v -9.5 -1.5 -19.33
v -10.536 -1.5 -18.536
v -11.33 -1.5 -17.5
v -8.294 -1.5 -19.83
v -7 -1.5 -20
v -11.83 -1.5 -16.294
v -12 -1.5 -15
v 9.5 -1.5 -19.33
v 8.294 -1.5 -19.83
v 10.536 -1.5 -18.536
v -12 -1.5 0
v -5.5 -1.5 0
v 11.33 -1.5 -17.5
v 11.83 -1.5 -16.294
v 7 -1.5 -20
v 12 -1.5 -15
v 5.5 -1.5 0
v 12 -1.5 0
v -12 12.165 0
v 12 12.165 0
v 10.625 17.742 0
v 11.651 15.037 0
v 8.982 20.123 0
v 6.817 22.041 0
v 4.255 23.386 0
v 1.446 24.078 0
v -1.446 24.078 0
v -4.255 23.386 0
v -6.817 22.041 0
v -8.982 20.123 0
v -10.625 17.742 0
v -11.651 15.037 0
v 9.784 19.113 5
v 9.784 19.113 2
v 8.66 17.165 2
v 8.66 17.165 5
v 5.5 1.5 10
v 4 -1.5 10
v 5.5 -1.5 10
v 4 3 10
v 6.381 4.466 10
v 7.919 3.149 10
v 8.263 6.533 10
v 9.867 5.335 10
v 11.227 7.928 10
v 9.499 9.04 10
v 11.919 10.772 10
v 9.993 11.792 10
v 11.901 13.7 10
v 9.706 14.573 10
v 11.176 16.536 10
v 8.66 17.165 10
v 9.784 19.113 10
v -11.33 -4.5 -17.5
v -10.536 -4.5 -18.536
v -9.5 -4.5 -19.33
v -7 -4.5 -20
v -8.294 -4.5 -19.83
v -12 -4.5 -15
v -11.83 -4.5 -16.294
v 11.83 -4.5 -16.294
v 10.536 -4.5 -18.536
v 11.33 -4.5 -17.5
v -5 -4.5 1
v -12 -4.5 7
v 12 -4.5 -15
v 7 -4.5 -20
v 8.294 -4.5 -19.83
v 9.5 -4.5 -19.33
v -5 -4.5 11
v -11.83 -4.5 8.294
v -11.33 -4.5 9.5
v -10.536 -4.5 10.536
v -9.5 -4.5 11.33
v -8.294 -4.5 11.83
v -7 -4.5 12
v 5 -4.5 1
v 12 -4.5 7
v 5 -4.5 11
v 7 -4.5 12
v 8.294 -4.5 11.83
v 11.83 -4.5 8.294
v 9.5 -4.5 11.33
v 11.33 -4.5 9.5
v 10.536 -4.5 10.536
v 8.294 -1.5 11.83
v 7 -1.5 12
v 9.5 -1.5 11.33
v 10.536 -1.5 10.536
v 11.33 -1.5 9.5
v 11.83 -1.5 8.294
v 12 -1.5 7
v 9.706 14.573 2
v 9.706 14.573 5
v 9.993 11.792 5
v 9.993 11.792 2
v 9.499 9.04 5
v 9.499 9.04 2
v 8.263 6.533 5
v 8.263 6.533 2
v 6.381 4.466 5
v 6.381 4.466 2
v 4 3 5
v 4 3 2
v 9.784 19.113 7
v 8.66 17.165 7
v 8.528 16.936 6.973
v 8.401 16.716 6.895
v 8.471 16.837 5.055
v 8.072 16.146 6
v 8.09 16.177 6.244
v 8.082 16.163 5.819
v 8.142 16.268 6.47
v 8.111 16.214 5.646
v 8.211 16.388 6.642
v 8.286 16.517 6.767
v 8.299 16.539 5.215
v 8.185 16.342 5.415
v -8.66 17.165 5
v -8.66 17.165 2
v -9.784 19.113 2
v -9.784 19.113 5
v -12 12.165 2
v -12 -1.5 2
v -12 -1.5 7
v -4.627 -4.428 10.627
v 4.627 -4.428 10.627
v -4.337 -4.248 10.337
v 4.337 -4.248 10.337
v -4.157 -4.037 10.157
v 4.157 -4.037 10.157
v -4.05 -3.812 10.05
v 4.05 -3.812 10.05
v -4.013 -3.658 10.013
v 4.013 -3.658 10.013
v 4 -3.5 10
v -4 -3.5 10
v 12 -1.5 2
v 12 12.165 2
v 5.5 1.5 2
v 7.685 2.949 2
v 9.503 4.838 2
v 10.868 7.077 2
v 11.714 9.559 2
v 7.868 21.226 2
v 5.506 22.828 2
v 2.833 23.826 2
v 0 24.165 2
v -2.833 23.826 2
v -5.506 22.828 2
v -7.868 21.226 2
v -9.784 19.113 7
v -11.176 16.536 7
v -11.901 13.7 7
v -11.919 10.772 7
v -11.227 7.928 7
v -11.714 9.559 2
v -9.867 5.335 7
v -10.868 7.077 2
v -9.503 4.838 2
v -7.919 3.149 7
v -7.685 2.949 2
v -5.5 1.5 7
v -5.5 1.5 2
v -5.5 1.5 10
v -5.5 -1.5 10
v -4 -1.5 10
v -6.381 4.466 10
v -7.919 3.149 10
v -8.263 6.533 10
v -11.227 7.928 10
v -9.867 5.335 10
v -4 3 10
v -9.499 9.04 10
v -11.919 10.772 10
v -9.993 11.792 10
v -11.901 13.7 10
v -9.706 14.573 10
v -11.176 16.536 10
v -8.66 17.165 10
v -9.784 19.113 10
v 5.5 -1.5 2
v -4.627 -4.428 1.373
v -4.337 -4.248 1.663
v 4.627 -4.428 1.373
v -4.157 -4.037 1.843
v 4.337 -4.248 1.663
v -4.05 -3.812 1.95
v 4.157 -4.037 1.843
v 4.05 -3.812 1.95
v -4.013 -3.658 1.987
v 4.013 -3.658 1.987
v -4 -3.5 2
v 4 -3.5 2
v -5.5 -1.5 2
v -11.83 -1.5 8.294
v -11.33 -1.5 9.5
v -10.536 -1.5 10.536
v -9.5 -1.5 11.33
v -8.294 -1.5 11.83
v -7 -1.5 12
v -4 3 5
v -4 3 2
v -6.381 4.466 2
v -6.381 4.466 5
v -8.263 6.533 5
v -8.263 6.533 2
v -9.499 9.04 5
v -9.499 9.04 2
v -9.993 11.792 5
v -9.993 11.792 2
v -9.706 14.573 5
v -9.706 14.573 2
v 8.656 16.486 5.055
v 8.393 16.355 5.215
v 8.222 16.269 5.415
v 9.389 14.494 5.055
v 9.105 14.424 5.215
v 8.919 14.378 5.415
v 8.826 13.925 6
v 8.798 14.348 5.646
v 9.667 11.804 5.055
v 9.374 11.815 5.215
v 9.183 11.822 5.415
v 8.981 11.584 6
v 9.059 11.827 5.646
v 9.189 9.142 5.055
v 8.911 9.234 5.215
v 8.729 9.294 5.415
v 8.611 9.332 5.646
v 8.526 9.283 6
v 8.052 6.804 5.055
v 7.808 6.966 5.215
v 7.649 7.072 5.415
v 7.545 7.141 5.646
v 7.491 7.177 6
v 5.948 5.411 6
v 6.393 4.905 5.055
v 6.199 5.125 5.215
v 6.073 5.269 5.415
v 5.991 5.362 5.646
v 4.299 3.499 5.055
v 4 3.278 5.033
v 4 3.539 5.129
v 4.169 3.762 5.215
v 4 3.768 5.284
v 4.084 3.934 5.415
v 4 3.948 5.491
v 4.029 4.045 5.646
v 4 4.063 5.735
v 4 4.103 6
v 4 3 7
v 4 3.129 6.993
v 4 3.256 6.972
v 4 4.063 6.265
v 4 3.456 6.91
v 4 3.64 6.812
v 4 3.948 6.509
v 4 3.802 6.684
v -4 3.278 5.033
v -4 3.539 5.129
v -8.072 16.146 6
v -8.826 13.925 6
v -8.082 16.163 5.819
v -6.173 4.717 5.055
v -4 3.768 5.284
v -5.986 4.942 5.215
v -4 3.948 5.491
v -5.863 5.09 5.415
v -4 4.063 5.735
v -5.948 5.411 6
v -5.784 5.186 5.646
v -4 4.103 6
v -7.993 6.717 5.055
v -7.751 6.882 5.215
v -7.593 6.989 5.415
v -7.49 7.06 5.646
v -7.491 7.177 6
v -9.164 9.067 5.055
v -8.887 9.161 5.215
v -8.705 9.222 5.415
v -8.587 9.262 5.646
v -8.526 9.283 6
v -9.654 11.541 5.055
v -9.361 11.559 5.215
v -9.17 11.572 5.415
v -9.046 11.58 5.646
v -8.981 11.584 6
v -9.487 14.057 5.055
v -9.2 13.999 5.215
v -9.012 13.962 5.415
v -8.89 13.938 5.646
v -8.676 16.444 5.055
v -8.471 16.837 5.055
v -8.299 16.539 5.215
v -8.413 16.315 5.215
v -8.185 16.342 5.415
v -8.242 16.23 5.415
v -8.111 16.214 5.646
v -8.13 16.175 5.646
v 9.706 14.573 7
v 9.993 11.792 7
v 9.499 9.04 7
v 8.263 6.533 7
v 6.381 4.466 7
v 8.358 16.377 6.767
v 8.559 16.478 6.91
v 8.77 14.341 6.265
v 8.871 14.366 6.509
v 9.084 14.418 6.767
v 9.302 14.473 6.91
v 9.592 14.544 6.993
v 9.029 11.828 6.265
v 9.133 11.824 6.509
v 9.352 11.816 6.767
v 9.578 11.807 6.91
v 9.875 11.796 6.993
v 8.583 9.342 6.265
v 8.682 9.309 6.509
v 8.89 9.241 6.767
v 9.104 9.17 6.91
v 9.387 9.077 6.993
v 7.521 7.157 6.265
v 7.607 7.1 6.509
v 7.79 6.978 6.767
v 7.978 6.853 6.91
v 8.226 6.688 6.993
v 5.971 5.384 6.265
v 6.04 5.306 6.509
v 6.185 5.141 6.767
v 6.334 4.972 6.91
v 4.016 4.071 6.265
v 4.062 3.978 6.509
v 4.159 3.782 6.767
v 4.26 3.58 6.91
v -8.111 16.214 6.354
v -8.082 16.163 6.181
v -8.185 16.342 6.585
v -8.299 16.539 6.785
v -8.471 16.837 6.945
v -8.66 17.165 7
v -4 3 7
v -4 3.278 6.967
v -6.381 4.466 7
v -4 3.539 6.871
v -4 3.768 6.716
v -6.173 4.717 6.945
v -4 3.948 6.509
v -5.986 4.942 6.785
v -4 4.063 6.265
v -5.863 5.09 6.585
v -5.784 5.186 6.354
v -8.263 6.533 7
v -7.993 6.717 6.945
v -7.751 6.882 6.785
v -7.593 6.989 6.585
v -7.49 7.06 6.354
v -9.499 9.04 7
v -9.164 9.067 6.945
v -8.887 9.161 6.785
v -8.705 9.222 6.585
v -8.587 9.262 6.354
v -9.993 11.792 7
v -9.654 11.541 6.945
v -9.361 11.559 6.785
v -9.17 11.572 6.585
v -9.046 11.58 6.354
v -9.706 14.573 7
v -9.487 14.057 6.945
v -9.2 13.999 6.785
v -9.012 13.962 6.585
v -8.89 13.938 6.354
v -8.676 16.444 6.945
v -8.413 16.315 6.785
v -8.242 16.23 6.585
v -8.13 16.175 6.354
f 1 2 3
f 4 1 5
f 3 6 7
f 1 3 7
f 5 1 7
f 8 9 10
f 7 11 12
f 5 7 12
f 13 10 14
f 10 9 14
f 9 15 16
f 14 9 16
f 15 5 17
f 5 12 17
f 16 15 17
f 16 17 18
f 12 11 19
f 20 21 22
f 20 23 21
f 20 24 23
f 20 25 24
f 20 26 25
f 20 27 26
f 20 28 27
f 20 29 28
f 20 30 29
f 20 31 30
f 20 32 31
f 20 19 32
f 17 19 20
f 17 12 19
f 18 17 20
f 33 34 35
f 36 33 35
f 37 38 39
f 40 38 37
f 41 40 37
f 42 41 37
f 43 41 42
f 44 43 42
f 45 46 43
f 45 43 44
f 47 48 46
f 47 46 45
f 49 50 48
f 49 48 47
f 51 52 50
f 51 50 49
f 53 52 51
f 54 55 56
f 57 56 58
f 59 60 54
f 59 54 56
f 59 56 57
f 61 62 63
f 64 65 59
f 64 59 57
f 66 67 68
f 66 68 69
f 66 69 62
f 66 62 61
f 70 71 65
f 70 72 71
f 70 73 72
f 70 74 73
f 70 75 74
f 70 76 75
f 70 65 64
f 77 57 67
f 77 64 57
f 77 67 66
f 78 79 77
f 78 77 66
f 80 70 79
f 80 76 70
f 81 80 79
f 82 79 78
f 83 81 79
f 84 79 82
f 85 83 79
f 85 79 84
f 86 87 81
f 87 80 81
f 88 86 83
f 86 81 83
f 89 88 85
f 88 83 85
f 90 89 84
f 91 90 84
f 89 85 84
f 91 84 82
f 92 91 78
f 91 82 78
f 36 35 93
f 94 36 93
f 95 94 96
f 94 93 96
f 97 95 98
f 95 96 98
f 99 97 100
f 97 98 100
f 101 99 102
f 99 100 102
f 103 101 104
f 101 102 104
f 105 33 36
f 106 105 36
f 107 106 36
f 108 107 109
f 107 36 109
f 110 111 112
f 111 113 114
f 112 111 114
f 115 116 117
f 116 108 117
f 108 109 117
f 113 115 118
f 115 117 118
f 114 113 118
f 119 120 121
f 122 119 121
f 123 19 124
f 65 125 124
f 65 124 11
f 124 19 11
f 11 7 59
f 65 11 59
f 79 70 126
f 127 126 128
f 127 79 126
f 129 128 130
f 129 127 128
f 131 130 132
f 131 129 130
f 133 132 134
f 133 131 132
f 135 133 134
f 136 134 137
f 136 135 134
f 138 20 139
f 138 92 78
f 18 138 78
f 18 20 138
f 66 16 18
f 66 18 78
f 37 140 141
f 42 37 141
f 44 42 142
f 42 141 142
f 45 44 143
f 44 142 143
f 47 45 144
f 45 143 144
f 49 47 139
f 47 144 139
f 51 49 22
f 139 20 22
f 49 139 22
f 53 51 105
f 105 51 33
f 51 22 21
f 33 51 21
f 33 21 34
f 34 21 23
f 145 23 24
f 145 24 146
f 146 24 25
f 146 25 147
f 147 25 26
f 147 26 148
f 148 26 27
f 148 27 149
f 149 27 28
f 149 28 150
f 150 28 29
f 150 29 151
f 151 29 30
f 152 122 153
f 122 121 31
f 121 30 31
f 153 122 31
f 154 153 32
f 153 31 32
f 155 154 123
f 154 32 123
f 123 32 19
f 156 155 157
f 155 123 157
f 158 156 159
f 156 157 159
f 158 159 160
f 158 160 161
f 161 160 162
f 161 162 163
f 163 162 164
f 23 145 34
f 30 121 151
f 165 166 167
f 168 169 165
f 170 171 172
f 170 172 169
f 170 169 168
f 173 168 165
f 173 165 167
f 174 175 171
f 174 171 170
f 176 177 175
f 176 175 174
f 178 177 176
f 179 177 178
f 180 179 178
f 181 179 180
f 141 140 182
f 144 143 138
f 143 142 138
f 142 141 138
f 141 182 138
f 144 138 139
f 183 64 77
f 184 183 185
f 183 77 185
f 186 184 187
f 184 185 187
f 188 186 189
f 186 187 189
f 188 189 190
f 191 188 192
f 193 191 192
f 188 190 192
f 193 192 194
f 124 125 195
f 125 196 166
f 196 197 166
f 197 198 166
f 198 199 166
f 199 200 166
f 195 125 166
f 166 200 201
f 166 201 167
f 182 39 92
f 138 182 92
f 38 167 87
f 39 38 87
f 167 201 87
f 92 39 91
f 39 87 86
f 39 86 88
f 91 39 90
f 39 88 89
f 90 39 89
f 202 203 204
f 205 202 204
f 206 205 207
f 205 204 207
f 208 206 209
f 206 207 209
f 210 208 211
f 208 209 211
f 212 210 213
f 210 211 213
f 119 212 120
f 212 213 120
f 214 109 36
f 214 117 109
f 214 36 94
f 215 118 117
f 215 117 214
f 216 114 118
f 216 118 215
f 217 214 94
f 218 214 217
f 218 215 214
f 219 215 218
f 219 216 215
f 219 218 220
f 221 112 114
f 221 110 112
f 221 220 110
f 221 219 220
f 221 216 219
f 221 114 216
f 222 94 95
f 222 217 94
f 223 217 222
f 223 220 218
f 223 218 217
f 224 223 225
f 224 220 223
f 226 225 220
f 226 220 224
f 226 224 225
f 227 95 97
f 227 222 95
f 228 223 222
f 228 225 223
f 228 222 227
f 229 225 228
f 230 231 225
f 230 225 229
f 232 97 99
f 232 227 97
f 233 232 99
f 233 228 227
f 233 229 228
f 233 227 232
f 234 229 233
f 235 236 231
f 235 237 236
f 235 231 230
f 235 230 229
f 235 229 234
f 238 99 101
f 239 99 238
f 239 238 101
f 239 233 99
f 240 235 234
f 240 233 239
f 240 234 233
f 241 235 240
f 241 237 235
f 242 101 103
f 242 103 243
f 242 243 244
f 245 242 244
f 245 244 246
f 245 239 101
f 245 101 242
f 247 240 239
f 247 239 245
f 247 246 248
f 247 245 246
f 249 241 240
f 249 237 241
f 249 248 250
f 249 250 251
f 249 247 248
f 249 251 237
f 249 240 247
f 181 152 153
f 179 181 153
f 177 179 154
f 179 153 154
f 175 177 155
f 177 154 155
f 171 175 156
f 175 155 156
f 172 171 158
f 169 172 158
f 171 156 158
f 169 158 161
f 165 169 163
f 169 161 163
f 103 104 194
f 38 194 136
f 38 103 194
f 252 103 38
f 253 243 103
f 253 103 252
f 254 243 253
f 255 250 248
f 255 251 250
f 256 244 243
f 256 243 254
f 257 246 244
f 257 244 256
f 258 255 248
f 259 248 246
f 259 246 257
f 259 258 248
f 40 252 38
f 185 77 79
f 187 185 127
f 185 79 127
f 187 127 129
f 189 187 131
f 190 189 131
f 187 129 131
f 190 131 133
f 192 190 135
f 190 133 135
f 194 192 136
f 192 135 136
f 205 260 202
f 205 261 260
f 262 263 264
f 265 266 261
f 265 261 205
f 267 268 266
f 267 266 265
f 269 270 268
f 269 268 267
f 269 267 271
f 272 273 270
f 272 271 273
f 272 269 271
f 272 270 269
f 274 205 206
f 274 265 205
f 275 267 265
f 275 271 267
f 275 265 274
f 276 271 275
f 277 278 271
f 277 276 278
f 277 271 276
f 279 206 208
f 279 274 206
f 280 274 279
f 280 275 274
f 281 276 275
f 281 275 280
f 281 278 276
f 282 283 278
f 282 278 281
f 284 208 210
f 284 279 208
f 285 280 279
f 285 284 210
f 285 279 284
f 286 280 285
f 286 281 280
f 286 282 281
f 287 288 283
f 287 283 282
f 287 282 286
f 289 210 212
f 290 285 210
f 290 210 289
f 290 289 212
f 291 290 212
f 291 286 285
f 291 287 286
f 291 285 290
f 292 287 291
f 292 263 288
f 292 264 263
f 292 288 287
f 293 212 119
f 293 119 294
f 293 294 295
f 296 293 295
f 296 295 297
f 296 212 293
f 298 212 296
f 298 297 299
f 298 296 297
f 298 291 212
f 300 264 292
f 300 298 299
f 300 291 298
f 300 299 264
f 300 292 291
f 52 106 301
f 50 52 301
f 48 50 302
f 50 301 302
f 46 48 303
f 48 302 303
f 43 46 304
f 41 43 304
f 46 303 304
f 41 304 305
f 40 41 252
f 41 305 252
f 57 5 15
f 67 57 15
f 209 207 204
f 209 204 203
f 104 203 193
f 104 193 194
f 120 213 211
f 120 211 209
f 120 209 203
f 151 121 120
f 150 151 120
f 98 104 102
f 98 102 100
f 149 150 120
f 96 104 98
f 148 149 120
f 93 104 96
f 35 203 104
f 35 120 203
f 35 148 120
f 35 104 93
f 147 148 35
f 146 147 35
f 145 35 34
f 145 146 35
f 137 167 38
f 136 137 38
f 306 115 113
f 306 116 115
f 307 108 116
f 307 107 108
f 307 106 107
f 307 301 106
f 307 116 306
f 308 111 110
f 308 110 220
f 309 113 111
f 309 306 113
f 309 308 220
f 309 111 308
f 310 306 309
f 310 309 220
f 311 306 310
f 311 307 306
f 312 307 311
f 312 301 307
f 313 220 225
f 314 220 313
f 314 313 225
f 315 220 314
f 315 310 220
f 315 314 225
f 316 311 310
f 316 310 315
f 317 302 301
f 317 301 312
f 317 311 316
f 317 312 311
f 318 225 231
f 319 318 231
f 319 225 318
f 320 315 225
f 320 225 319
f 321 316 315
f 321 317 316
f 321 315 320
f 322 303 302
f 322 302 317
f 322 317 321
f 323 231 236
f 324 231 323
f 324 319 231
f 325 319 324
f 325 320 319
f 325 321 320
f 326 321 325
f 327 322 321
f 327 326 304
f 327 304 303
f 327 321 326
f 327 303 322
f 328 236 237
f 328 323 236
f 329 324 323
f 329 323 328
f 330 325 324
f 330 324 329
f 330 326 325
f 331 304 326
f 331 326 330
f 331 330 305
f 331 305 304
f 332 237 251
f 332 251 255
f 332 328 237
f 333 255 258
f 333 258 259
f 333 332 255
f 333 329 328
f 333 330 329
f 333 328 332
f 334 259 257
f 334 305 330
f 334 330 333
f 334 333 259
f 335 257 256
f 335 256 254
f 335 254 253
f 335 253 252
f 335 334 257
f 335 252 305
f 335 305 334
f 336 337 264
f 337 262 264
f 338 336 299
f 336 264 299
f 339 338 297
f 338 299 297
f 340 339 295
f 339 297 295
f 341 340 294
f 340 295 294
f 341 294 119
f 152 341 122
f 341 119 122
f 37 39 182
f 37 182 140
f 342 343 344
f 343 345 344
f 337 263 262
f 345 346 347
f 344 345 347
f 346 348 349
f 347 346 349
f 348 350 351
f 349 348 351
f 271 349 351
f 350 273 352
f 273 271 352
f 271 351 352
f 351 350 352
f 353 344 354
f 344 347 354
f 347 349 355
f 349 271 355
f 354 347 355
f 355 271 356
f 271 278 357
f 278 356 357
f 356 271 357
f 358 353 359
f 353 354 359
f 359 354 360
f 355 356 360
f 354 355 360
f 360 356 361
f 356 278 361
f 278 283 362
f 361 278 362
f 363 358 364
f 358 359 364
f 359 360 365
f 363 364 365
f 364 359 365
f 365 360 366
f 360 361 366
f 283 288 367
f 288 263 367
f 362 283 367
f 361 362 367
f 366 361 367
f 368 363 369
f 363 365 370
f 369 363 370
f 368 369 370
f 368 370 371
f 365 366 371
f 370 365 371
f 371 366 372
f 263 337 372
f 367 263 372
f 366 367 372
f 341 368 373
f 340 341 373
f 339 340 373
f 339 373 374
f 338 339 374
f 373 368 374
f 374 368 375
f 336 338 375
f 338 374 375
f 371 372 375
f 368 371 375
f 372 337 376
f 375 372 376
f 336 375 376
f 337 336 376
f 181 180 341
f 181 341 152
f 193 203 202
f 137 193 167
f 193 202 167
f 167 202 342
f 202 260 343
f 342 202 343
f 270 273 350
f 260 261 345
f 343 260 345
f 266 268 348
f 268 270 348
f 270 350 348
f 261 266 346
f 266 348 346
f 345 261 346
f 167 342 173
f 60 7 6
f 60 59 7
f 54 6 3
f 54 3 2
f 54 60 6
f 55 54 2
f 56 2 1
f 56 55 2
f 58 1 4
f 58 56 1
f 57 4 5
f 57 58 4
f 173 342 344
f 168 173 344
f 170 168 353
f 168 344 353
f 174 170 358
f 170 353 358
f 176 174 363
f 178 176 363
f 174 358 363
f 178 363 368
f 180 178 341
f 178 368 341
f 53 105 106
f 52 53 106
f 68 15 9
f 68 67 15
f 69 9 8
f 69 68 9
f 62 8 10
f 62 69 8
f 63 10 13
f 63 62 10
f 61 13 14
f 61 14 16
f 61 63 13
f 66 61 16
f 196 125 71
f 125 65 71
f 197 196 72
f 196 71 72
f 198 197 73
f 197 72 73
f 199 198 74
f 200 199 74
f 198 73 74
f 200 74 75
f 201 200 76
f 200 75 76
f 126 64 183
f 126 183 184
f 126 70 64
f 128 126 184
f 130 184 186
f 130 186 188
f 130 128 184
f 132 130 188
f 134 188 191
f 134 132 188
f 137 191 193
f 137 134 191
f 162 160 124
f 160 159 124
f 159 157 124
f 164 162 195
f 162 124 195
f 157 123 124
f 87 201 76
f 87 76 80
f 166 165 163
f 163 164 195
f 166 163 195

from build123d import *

# Parameters (mm, degrees)
F1_DEPTH  = 2
F3_DEPTH  = 3
F5_DEPTH  = 2
F7_DEPTH  = 3
F8_R      = 0.99999
F9_W      = 24
F9_H      = 22.6653645039
F10_DEPTH = 10
F11_W     = 24
F11_H     = 32
F11_W_2   = 8
F11_H_2   = 8
F12_DEPTH = 3
F13_R     = 1
F14_R     = 5
F15_W     = 24
F15_H     = 13.6653645039
F16_DEPTH = 2


# Not quite as in the source:
# - a fillet or chamfer is up to 0.001 mm smaller than in the source, because OpenCascade refuses the exact size


with BuildPart() as f1:
    # F0 (on Top) → F1 (new body)
    with BuildSketch(Plane.XY):
        with BuildLine():
            ThreePointArc((5.5, 1.5), (0, 24.1653645039), (-5.5, 1.5))
            Line((-5.5, 1.5), (-5.5, -1.5))
            ThreePointArc((-5.5, -1.5), (0, -24.1653645039), (5.5, -1.5))
            Line((5.5, -1.5), (5.5, 1.5))
        make_face()
    extrude(amount=F1_DEPTH)

    # F2 (on face) → F3 (join)
    with BuildSketch(Plane.XY.offset(2)):
        with BuildLine():
            Line((9.7844830762, 19.1125863177), (8.6602540378, 17.1653645039))
            ThreePointArc((8.6602540378, 17.1653645039), (9.4991255677, 9.0402063559), (4, 3.0002131139))
            Line((4, 3.0002131139), (4, -6.2432010007))
            Line((4, -6.2432010007), (9.1651513899, -16.1653645039))
            ThreePointArc((9.1651513899, -16.1653645039), (9.5868378212, -9.3206253964), (5.5, -3.8137179596))
            Line((5.5, -3.8137179596), (5.5, 1.5))
            ThreePointArc((5.5, 1.5), (11.6599594736, 9.3289327537), (9.7844830762, 19.1125863177))
        make_face()
        with BuildLine():
            ThreePointArc((-4, 3.0002131139), (-9.4991255677, 9.0402063559), (-8.6602540378, 17.1653645039))
            Line((-8.6602540378, 17.1653645039), (-9.7844830762, 19.1125863177))
            ThreePointArc((-9.7844830762, 19.1125863177), (-11.6599594736, 9.3289327537), (-5.5, 1.5))
            Line((-5.5, 1.5), (-5.5, -3.8137179596))
            ThreePointArc((-5.5, -3.8137179596), (-9.5868378212, -9.3206253964), (-9.1651513899, -16.1653645039))
            Line((-9.1651513899, -16.1653645039), (-4, -6.2432010007))
            Line((-4, -6.2432010007), (-4, 3.0002131139))
        make_face()
    extrude(amount=F3_DEPTH)

    # F4 (on face) → F5 (join)
    with BuildSketch(Plane.XY.offset(5)):
        with BuildLine():
            Line((-8.0717844057, 16.1461052023), (-9.7844830762, 19.1125863177))
            ThreePointArc((-9.7844830762, 19.1125863177), (-11.6599594736, 9.3289327537), (-5.5, 1.5))
            Line((-5.5, 1.5), (-5.5, -5.0414610795))
            ThreePointArc((-5.5, -5.0414610795), (-8.6043935433, -9.5263473097), (-8.5483759414, -14.980549891))
            Line((-8.5483759414, -14.980549891), (-4, -6.2432010007))
            Line((-4, -6.2432010007), (-4, 4.1031067556))
            ThreePointArc((-4, 4.1031067556), (-8.5258693153, 9.2827350759), (-8.0717844057, 16.1461052023))
        make_face()
        with BuildLine():
            ThreePointArc((5.5, 1.5), (11.6599594736, 9.3289327537), (9.7844830762, 19.1125863177))
            Line((9.7844830762, 19.1125863177), (8.0717844057, 16.1461052023))
            ThreePointArc((8.0717844057, 16.1461052023), (8.5258693153, 9.2827350759), (4, 4.1031067556))
            Line((4, 4.1031067556), (4, -6.2432010007))
            Line((4, -6.2432010007), (8.5483759414, -14.980549891))
            ThreePointArc((8.5483759414, -14.980549891), (8.6043935433, -9.5263473097), (5.5, -5.0414610795))
            Line((5.5, -5.0414610795), (5.5, 1.5))
        make_face()
    extrude(amount=F5_DEPTH)

    # F6 (on face) → F7 (join)
    with BuildSketch(Plane.XY.offset(7)):
        with BuildLine():
            Line((9.7844830762, 19.1125863177), (8.6602540378, 17.1653645039))
            ThreePointArc((8.6602540378, 17.1653645039), (9.4991255677, 9.0402063559), (4, 3.0002131139))
            Line((4, 3.0002131139), (4, -6.2432010007))
            Line((4, -6.2432010007), (9.1651513899, -16.1653645039))
            ThreePointArc((9.1651513899, -16.1653645039), (9.5868378212, -9.3206253964), (5.5, -3.8137179596))
            Line((5.5, -3.8137179596), (5.5, 1.5))
            ThreePointArc((5.5, 1.5), (11.6599594736, 9.3289327537), (9.7844830762, 19.1125863177))
        make_face()
        with BuildLine():
            ThreePointArc((-4, 3.0002131139), (-9.4991255677, 9.0402063559), (-8.6602540378, 17.1653645039))
            Line((-8.6602540378, 17.1653645039), (-9.7844830762, 19.1125863177))
            ThreePointArc((-9.7844830762, 19.1125863177), (-11.6599594736, 9.3289327537), (-5.5, 1.5))
            Line((-5.5, 1.5), (-5.5, -3.8137179596))
            ThreePointArc((-5.5, -3.8137179596), (-9.5868378212, -9.3206253964), (-9.1651513899, -16.1653645039))
            Line((-9.1651513899, -16.1653645039), (-4, -6.2432010007))
            Line((-4, -6.2432010007), (-4, 3.0002131139))
        make_face()
    extrude(amount=F7_DEPTH)

    # F8 (radius 1 in the source; OpenCascade refuses exactly that, so slightly less here)
    f8_edges = [f1.edges().sort_by_distance(p)[0] for p in [
        (8.525869, 9.282735, 7),
        (-8.525869, 9.282735, 7),
        (-8.525869, 9.282735, 5),
        (8.525869, 9.282735, 5),
        (-8.604394, -9.526347, 5),
        (-8.604394, -9.526347, 7),
        (8.604394, -9.526347, 7),
        (8.604394, -9.526347, 5),
    ]]
    fillet(f8_edges, radius=F8_R)

    # F9 (on face) → F10 (cut)
    with BuildSketch(Plane.XY.offset(10)):
        with Locations((0, -12.8326822519)):
            Rectangle(F9_W, F9_H)
    extrude(amount=-F10_DEPTH, mode=Mode.SUBTRACT)

    # F11 (on face) → F12 (join)
    with BuildSketch(Plane.XZ.offset(1.5)):
        with Locations((0, -4)):
            Rectangle(F11_W, F11_H)
        with Locations((0, 6)):
            Rectangle(F11_W_2, F11_H_2, mode=Mode.SUBTRACT)
    extrude(amount=F12_DEPTH)

    # F13
    f13_edges = [f1.edges().sort_by_distance(p)[0] for p in [
        (0, -4.5, 10),
        (4, -4.5, 6),
        (-4, -4.5, 6),
        (0, -4.5, 2),
    ]]
    fillet(f13_edges, radius=F13_R)

    # F14
    f14_edges = [f1.edges().sort_by_distance(p)[0] for p in [
        (-12, -3, 12),
        (12, -3, 12),
        (12, -3, -20),
        (-12, -3, -20),
    ]]
    fillet(f14_edges, radius=F14_R)

    # F15 (on face) → F16 (join)
    with BuildSketch(Plane(origin=(0, 0, 0), x_dir=(1, 0, 0), z_dir=(0, 0, -1))):
        with Locations((0, -5.3326822519)):
            Rectangle(F15_W, F15_H)
    extrude(amount=-F16_DEPTH)


solid = f1.part
